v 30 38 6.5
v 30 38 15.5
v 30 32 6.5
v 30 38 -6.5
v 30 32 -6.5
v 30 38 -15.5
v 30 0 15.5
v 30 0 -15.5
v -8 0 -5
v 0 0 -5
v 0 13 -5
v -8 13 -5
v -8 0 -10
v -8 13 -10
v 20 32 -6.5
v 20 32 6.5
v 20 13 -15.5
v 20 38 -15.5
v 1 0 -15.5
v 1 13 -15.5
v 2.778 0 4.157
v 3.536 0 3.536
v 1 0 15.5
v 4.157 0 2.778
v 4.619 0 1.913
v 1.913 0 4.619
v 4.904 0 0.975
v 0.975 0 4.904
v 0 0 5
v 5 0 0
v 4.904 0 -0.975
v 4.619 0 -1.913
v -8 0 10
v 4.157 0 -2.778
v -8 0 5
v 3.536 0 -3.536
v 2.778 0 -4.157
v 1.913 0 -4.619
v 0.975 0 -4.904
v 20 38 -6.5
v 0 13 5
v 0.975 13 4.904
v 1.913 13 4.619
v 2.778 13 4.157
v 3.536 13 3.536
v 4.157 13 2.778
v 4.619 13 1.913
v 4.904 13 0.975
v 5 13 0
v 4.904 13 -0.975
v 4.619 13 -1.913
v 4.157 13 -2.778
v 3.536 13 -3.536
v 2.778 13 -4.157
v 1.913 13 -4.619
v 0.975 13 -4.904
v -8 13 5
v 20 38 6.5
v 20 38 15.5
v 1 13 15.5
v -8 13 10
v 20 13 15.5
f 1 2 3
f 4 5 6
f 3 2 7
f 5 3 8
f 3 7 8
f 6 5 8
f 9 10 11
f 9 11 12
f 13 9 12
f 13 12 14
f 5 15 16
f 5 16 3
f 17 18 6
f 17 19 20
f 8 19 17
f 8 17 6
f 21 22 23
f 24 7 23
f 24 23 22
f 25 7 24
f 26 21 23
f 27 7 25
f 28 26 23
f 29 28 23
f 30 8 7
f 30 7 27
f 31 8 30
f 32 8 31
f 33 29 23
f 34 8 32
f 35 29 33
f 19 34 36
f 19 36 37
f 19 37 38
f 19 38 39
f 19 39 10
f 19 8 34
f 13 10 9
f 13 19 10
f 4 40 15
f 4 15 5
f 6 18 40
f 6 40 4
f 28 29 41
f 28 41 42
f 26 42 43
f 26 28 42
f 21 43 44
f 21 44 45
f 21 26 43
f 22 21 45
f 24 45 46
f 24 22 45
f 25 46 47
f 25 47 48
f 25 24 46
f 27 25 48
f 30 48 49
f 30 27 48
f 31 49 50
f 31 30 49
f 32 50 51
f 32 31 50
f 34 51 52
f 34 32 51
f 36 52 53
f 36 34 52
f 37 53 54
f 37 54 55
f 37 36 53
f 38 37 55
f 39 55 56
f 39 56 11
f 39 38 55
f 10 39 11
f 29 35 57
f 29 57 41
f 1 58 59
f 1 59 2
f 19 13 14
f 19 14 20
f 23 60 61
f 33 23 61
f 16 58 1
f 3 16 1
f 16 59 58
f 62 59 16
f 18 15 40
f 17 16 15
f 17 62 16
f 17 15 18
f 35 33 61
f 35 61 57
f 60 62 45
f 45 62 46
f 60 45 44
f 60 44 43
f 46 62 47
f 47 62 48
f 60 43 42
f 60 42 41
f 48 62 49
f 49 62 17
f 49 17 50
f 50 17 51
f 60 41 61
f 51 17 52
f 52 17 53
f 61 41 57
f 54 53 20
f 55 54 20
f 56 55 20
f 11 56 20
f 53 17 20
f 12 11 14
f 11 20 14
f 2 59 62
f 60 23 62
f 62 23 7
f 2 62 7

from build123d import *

# Parameters (mm, degrees)
EXTRUDE_1_DEPTH     = 13
SKETCH_2_W          = 10
SKETCH_2_H          = 31
EXTRUDE_2_DEPTH     = 25
SKETCH_3_W          = 10
SKETCH_3_H          = 13
CUT_EXTRUDE_1_DEPTH = 6


with BuildPart() as part:
    # 草图1 → 凸台-拉伸1 (new body)
    with BuildSketch(Plane(origin=(0, 0, 0), x_dir=(1, 0, 0), z_dir=(0, 1, 0))):
        with BuildLine():
            Line((0, 5), (-8, 5))
            Line((-8, 5), (-8, 10))
            Line((-8, 10), (1, 15.5))
            Line((1, 15.5), (30, 15.5))
            Line((30, 15.5), (30, -15.5))
            Line((30, -15.5), (1, -15.5))
            Line((1, -15.5), (-8, -10))
            Line((-8, -10), (-8, -5))
            Line((-8, -5), (0, -5))
            ThreePointArc((0, -5), (5, 0), (0, 5))
        make_face()
    extrude(amount=EXTRUDE_1_DEPTH)

    # 草图2 → 凸台-拉伸2 (add)
    with BuildSketch(Plane(origin=(0, 13, 0), x_dir=(1, 0, 0), z_dir=(0, 1, 0))):
        with Locations((25, 0)):
            Rectangle(SKETCH_2_W, SKETCH_2_H)
    extrude(amount=EXTRUDE_2_DEPTH)

    # 草图3 → 切除-拉伸1 (cut)
    with BuildSketch(Plane(origin=(0, 38, 0), x_dir=(1, 0, 0), z_dir=(0, 1, 0))):
        with Locations((25, 0)):
            Rectangle(SKETCH_3_W, SKETCH_3_H)
    extrude(amount=-CUT_EXTRUDE_1_DEPTH, mode=Mode.SUBTRACT)


solid = part.part
